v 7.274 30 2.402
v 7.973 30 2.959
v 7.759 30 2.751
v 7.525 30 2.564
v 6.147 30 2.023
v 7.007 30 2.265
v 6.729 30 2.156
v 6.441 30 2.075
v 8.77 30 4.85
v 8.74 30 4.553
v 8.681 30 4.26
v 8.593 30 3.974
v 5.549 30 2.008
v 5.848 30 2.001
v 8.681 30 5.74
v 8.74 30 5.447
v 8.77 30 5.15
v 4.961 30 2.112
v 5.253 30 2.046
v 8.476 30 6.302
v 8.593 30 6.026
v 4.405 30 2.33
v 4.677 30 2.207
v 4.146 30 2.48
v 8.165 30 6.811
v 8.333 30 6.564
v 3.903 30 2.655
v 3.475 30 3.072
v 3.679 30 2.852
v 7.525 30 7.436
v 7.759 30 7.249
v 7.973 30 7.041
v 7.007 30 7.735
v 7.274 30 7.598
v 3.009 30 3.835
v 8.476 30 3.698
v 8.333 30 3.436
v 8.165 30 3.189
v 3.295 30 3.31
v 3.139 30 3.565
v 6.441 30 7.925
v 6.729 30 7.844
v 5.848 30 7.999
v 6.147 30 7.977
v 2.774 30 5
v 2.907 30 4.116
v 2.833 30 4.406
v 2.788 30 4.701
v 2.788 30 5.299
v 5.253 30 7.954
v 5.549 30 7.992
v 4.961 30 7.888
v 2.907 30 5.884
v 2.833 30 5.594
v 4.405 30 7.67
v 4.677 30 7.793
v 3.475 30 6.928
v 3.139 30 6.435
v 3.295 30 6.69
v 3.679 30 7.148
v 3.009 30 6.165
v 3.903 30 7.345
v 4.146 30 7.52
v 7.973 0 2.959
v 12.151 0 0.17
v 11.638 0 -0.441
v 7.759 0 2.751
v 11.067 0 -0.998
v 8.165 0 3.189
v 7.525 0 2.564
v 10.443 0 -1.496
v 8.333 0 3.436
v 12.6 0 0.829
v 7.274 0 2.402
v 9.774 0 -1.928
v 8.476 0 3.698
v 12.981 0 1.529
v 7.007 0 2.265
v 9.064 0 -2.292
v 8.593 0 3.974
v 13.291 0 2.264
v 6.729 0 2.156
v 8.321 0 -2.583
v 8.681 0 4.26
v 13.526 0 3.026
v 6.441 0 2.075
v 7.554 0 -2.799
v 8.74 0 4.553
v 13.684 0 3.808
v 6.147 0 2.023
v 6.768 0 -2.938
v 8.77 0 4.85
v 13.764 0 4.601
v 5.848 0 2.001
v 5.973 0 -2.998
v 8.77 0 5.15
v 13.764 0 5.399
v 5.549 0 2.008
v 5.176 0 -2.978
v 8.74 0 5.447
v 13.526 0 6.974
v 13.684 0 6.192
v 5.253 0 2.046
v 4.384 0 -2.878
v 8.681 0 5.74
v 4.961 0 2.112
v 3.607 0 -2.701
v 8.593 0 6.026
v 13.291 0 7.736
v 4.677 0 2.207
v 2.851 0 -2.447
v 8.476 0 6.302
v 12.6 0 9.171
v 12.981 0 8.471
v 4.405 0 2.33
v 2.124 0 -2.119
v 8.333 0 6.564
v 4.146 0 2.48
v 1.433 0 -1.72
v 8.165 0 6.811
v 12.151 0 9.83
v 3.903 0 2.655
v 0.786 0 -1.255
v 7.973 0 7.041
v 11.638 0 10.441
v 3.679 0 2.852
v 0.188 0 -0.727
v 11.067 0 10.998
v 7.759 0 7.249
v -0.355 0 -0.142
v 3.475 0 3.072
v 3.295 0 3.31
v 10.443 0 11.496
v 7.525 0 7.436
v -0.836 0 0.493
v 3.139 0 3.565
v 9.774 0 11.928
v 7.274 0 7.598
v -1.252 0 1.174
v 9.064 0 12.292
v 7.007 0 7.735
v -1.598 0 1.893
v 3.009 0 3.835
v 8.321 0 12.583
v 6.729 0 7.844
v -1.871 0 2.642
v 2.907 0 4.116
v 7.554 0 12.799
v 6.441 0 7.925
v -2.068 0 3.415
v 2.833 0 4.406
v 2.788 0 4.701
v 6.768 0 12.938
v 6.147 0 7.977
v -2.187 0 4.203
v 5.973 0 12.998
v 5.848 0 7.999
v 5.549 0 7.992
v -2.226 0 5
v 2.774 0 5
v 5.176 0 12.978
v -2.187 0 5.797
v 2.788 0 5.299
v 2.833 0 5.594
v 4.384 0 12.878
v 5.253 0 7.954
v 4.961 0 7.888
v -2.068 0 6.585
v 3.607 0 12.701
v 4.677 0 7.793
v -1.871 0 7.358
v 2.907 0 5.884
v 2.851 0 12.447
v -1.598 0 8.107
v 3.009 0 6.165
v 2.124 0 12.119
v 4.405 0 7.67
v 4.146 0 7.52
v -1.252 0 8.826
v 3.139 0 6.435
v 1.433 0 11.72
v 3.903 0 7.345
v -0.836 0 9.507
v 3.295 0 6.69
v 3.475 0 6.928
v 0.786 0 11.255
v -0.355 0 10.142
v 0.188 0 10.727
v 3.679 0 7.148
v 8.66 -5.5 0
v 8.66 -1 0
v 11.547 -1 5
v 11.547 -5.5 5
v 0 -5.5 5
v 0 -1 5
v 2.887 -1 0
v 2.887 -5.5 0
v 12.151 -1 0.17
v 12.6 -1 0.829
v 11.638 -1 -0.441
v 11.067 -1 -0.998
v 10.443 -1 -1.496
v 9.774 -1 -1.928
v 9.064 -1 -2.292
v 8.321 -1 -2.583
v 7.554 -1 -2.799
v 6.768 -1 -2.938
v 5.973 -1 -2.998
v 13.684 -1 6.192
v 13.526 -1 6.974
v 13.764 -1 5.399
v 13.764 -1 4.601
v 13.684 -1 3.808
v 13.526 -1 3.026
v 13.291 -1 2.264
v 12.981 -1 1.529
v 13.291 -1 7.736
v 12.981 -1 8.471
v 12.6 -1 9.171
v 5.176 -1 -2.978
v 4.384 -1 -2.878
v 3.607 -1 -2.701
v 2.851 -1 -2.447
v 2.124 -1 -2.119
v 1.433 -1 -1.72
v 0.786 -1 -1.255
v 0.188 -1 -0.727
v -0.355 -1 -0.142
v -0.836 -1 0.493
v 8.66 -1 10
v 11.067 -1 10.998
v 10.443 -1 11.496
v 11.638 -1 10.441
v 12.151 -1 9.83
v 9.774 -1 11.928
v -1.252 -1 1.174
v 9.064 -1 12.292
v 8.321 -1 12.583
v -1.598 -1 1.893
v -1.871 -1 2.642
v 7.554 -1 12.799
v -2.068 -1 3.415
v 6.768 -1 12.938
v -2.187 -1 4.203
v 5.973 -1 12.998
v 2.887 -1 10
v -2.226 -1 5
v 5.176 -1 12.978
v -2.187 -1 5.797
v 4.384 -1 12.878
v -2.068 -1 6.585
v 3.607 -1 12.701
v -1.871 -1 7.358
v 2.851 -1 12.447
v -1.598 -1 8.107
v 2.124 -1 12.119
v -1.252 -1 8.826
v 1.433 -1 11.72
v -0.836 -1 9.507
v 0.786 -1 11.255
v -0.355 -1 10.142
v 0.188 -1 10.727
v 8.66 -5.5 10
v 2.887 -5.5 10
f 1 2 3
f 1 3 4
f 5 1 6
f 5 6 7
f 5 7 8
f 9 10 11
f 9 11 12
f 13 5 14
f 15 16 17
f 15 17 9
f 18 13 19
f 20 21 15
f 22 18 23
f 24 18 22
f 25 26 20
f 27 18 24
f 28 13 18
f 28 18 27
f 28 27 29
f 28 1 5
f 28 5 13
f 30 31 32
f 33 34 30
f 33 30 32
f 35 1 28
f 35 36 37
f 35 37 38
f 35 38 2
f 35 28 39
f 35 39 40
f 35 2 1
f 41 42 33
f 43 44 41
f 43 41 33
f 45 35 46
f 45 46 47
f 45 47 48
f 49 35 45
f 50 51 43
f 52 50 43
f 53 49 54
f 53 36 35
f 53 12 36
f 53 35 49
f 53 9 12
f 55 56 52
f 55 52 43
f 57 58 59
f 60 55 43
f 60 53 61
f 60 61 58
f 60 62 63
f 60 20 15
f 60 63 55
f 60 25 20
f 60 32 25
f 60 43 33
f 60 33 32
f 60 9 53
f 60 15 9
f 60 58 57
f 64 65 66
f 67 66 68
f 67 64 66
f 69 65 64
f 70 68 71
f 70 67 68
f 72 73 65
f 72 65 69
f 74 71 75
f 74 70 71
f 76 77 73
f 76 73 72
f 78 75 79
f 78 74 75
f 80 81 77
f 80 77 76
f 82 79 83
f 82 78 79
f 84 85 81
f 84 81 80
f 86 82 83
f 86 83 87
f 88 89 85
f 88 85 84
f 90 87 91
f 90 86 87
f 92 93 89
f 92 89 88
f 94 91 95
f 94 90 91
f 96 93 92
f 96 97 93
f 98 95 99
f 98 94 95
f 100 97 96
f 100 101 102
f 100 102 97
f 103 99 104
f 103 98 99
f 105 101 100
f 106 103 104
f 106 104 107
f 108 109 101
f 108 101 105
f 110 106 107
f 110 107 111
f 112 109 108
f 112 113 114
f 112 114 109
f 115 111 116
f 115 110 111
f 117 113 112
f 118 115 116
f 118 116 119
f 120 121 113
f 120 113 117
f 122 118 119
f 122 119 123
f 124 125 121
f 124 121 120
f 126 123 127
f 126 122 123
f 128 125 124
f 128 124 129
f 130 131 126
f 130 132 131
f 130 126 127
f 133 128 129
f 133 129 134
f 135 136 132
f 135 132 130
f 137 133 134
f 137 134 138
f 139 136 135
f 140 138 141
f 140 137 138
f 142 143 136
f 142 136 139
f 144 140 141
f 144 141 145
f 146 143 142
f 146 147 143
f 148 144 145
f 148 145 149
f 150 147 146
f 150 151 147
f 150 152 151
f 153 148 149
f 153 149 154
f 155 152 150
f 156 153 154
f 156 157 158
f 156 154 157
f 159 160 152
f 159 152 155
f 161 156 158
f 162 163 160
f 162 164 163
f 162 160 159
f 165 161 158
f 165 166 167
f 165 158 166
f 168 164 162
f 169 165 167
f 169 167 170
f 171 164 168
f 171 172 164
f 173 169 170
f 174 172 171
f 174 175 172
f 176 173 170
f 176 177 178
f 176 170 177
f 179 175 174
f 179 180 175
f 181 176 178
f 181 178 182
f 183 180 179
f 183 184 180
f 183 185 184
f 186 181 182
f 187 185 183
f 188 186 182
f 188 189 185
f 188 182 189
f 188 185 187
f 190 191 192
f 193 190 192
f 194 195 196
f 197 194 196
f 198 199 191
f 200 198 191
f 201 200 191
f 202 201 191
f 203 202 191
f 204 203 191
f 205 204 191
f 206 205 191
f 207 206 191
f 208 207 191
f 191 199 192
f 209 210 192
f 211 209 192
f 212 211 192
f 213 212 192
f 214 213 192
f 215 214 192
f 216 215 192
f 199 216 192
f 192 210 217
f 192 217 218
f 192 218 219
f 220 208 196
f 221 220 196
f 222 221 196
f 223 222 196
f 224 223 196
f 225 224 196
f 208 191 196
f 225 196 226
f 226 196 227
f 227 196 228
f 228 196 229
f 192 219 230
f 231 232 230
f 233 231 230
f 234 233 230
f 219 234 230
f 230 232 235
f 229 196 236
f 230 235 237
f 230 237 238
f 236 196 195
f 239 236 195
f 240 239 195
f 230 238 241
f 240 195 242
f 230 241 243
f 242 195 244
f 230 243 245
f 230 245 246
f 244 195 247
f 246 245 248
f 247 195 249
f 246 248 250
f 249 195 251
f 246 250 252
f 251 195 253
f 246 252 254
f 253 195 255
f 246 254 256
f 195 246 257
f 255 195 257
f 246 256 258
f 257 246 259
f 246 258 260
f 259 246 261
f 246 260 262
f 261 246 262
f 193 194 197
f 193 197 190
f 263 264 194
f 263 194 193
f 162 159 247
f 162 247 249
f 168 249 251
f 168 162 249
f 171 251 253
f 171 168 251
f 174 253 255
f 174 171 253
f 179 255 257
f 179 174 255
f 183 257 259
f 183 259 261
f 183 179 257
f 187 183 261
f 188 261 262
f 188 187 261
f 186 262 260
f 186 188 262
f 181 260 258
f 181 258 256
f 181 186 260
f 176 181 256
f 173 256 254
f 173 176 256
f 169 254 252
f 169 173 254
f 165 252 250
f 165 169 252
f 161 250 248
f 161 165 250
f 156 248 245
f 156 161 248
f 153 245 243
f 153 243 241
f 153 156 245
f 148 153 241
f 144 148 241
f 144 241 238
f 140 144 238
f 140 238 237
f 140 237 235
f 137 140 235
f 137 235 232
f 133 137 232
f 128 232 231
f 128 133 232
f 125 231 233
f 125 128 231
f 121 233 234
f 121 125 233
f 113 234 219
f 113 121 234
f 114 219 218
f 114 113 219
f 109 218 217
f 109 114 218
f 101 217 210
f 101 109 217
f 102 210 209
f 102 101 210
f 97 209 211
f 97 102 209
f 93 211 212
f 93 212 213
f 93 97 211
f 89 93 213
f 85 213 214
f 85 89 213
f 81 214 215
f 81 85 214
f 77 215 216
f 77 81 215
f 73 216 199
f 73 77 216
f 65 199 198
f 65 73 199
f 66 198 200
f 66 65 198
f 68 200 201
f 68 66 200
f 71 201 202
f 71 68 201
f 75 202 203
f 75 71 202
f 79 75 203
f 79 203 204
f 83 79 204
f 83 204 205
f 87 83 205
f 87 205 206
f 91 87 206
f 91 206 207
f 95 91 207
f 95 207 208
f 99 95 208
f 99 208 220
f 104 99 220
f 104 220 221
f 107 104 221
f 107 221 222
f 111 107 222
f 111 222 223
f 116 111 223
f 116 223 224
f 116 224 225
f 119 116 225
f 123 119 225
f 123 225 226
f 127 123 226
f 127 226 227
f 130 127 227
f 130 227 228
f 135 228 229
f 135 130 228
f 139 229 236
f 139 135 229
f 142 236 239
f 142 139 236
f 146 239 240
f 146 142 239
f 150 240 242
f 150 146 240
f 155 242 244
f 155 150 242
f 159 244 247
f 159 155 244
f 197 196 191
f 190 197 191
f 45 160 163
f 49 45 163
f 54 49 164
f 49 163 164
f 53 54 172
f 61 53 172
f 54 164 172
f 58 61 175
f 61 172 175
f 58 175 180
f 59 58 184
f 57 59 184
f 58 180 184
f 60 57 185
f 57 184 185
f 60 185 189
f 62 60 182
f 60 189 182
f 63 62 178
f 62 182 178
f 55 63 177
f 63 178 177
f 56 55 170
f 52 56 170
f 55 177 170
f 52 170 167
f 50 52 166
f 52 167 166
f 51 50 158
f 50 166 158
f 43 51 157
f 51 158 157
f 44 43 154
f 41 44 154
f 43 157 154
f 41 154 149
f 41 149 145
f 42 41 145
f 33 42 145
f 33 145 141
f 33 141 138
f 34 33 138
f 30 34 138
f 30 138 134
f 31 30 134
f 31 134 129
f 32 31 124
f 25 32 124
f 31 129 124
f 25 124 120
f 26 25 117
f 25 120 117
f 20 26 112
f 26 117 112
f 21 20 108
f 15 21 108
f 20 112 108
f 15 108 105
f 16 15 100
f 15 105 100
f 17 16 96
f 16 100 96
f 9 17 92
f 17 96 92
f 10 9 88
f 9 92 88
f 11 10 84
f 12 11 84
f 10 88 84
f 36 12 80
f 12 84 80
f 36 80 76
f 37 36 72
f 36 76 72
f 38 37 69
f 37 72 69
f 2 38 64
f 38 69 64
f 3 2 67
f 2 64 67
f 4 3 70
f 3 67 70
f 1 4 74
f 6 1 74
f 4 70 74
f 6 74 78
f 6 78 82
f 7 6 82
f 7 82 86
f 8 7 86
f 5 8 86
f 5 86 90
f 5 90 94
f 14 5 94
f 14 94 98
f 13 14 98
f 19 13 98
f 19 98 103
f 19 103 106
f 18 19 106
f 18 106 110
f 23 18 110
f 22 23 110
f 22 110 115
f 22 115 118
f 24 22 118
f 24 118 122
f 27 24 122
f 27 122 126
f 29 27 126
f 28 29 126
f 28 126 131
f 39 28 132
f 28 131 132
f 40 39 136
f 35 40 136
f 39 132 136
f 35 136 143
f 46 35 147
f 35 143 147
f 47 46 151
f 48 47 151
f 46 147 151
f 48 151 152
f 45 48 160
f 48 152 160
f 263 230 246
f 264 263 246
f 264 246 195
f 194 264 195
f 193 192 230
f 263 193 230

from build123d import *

# Parameters (mm, degrees)
F1_DEPTH = 5.5
F2_R     = 8
F3_DEPTH = 1
F4_R     = 3
F5_DEPTH = 30


with BuildPart() as f1:
    # F0 (on Front) → F1 (new body)
    with BuildSketch(Plane.XZ):
        Polygon((0, 5), (2.886751, 0), (8.660254, 0), (11.547005, 5), (8.660254, 10), (2.886751, 10), align=None)
    extrude(amount=F1_DEPTH)

    # F2 (on face) → F3 (join)
    with BuildSketch(Plane(origin=(0, 0, 0), x_dir=(-1, 0, 0), z_dir=(0, 1, 0))):
        with Locations((-5.773503, 5)):
            Circle(F2_R)
        Polygon((-2.886751, 10), (0, 5), (-2.886751, 0), (-8.660254, 0), (-11.547005, 5), (-8.660254, 10), align=None, mode=Mode.SUBTRACT)
    extrude(amount=-F3_DEPTH)

    # F4 (on face) → F5 (join)
    with BuildSketch(Plane(origin=(0, 0, 0), x_dir=(-1, 0, 0), z_dir=(0, 1, 0))):
        with Locations((-5.773503, 5)):
            Circle(F4_R)
    extrude(amount=F5_DEPTH)


solid = f1.part
